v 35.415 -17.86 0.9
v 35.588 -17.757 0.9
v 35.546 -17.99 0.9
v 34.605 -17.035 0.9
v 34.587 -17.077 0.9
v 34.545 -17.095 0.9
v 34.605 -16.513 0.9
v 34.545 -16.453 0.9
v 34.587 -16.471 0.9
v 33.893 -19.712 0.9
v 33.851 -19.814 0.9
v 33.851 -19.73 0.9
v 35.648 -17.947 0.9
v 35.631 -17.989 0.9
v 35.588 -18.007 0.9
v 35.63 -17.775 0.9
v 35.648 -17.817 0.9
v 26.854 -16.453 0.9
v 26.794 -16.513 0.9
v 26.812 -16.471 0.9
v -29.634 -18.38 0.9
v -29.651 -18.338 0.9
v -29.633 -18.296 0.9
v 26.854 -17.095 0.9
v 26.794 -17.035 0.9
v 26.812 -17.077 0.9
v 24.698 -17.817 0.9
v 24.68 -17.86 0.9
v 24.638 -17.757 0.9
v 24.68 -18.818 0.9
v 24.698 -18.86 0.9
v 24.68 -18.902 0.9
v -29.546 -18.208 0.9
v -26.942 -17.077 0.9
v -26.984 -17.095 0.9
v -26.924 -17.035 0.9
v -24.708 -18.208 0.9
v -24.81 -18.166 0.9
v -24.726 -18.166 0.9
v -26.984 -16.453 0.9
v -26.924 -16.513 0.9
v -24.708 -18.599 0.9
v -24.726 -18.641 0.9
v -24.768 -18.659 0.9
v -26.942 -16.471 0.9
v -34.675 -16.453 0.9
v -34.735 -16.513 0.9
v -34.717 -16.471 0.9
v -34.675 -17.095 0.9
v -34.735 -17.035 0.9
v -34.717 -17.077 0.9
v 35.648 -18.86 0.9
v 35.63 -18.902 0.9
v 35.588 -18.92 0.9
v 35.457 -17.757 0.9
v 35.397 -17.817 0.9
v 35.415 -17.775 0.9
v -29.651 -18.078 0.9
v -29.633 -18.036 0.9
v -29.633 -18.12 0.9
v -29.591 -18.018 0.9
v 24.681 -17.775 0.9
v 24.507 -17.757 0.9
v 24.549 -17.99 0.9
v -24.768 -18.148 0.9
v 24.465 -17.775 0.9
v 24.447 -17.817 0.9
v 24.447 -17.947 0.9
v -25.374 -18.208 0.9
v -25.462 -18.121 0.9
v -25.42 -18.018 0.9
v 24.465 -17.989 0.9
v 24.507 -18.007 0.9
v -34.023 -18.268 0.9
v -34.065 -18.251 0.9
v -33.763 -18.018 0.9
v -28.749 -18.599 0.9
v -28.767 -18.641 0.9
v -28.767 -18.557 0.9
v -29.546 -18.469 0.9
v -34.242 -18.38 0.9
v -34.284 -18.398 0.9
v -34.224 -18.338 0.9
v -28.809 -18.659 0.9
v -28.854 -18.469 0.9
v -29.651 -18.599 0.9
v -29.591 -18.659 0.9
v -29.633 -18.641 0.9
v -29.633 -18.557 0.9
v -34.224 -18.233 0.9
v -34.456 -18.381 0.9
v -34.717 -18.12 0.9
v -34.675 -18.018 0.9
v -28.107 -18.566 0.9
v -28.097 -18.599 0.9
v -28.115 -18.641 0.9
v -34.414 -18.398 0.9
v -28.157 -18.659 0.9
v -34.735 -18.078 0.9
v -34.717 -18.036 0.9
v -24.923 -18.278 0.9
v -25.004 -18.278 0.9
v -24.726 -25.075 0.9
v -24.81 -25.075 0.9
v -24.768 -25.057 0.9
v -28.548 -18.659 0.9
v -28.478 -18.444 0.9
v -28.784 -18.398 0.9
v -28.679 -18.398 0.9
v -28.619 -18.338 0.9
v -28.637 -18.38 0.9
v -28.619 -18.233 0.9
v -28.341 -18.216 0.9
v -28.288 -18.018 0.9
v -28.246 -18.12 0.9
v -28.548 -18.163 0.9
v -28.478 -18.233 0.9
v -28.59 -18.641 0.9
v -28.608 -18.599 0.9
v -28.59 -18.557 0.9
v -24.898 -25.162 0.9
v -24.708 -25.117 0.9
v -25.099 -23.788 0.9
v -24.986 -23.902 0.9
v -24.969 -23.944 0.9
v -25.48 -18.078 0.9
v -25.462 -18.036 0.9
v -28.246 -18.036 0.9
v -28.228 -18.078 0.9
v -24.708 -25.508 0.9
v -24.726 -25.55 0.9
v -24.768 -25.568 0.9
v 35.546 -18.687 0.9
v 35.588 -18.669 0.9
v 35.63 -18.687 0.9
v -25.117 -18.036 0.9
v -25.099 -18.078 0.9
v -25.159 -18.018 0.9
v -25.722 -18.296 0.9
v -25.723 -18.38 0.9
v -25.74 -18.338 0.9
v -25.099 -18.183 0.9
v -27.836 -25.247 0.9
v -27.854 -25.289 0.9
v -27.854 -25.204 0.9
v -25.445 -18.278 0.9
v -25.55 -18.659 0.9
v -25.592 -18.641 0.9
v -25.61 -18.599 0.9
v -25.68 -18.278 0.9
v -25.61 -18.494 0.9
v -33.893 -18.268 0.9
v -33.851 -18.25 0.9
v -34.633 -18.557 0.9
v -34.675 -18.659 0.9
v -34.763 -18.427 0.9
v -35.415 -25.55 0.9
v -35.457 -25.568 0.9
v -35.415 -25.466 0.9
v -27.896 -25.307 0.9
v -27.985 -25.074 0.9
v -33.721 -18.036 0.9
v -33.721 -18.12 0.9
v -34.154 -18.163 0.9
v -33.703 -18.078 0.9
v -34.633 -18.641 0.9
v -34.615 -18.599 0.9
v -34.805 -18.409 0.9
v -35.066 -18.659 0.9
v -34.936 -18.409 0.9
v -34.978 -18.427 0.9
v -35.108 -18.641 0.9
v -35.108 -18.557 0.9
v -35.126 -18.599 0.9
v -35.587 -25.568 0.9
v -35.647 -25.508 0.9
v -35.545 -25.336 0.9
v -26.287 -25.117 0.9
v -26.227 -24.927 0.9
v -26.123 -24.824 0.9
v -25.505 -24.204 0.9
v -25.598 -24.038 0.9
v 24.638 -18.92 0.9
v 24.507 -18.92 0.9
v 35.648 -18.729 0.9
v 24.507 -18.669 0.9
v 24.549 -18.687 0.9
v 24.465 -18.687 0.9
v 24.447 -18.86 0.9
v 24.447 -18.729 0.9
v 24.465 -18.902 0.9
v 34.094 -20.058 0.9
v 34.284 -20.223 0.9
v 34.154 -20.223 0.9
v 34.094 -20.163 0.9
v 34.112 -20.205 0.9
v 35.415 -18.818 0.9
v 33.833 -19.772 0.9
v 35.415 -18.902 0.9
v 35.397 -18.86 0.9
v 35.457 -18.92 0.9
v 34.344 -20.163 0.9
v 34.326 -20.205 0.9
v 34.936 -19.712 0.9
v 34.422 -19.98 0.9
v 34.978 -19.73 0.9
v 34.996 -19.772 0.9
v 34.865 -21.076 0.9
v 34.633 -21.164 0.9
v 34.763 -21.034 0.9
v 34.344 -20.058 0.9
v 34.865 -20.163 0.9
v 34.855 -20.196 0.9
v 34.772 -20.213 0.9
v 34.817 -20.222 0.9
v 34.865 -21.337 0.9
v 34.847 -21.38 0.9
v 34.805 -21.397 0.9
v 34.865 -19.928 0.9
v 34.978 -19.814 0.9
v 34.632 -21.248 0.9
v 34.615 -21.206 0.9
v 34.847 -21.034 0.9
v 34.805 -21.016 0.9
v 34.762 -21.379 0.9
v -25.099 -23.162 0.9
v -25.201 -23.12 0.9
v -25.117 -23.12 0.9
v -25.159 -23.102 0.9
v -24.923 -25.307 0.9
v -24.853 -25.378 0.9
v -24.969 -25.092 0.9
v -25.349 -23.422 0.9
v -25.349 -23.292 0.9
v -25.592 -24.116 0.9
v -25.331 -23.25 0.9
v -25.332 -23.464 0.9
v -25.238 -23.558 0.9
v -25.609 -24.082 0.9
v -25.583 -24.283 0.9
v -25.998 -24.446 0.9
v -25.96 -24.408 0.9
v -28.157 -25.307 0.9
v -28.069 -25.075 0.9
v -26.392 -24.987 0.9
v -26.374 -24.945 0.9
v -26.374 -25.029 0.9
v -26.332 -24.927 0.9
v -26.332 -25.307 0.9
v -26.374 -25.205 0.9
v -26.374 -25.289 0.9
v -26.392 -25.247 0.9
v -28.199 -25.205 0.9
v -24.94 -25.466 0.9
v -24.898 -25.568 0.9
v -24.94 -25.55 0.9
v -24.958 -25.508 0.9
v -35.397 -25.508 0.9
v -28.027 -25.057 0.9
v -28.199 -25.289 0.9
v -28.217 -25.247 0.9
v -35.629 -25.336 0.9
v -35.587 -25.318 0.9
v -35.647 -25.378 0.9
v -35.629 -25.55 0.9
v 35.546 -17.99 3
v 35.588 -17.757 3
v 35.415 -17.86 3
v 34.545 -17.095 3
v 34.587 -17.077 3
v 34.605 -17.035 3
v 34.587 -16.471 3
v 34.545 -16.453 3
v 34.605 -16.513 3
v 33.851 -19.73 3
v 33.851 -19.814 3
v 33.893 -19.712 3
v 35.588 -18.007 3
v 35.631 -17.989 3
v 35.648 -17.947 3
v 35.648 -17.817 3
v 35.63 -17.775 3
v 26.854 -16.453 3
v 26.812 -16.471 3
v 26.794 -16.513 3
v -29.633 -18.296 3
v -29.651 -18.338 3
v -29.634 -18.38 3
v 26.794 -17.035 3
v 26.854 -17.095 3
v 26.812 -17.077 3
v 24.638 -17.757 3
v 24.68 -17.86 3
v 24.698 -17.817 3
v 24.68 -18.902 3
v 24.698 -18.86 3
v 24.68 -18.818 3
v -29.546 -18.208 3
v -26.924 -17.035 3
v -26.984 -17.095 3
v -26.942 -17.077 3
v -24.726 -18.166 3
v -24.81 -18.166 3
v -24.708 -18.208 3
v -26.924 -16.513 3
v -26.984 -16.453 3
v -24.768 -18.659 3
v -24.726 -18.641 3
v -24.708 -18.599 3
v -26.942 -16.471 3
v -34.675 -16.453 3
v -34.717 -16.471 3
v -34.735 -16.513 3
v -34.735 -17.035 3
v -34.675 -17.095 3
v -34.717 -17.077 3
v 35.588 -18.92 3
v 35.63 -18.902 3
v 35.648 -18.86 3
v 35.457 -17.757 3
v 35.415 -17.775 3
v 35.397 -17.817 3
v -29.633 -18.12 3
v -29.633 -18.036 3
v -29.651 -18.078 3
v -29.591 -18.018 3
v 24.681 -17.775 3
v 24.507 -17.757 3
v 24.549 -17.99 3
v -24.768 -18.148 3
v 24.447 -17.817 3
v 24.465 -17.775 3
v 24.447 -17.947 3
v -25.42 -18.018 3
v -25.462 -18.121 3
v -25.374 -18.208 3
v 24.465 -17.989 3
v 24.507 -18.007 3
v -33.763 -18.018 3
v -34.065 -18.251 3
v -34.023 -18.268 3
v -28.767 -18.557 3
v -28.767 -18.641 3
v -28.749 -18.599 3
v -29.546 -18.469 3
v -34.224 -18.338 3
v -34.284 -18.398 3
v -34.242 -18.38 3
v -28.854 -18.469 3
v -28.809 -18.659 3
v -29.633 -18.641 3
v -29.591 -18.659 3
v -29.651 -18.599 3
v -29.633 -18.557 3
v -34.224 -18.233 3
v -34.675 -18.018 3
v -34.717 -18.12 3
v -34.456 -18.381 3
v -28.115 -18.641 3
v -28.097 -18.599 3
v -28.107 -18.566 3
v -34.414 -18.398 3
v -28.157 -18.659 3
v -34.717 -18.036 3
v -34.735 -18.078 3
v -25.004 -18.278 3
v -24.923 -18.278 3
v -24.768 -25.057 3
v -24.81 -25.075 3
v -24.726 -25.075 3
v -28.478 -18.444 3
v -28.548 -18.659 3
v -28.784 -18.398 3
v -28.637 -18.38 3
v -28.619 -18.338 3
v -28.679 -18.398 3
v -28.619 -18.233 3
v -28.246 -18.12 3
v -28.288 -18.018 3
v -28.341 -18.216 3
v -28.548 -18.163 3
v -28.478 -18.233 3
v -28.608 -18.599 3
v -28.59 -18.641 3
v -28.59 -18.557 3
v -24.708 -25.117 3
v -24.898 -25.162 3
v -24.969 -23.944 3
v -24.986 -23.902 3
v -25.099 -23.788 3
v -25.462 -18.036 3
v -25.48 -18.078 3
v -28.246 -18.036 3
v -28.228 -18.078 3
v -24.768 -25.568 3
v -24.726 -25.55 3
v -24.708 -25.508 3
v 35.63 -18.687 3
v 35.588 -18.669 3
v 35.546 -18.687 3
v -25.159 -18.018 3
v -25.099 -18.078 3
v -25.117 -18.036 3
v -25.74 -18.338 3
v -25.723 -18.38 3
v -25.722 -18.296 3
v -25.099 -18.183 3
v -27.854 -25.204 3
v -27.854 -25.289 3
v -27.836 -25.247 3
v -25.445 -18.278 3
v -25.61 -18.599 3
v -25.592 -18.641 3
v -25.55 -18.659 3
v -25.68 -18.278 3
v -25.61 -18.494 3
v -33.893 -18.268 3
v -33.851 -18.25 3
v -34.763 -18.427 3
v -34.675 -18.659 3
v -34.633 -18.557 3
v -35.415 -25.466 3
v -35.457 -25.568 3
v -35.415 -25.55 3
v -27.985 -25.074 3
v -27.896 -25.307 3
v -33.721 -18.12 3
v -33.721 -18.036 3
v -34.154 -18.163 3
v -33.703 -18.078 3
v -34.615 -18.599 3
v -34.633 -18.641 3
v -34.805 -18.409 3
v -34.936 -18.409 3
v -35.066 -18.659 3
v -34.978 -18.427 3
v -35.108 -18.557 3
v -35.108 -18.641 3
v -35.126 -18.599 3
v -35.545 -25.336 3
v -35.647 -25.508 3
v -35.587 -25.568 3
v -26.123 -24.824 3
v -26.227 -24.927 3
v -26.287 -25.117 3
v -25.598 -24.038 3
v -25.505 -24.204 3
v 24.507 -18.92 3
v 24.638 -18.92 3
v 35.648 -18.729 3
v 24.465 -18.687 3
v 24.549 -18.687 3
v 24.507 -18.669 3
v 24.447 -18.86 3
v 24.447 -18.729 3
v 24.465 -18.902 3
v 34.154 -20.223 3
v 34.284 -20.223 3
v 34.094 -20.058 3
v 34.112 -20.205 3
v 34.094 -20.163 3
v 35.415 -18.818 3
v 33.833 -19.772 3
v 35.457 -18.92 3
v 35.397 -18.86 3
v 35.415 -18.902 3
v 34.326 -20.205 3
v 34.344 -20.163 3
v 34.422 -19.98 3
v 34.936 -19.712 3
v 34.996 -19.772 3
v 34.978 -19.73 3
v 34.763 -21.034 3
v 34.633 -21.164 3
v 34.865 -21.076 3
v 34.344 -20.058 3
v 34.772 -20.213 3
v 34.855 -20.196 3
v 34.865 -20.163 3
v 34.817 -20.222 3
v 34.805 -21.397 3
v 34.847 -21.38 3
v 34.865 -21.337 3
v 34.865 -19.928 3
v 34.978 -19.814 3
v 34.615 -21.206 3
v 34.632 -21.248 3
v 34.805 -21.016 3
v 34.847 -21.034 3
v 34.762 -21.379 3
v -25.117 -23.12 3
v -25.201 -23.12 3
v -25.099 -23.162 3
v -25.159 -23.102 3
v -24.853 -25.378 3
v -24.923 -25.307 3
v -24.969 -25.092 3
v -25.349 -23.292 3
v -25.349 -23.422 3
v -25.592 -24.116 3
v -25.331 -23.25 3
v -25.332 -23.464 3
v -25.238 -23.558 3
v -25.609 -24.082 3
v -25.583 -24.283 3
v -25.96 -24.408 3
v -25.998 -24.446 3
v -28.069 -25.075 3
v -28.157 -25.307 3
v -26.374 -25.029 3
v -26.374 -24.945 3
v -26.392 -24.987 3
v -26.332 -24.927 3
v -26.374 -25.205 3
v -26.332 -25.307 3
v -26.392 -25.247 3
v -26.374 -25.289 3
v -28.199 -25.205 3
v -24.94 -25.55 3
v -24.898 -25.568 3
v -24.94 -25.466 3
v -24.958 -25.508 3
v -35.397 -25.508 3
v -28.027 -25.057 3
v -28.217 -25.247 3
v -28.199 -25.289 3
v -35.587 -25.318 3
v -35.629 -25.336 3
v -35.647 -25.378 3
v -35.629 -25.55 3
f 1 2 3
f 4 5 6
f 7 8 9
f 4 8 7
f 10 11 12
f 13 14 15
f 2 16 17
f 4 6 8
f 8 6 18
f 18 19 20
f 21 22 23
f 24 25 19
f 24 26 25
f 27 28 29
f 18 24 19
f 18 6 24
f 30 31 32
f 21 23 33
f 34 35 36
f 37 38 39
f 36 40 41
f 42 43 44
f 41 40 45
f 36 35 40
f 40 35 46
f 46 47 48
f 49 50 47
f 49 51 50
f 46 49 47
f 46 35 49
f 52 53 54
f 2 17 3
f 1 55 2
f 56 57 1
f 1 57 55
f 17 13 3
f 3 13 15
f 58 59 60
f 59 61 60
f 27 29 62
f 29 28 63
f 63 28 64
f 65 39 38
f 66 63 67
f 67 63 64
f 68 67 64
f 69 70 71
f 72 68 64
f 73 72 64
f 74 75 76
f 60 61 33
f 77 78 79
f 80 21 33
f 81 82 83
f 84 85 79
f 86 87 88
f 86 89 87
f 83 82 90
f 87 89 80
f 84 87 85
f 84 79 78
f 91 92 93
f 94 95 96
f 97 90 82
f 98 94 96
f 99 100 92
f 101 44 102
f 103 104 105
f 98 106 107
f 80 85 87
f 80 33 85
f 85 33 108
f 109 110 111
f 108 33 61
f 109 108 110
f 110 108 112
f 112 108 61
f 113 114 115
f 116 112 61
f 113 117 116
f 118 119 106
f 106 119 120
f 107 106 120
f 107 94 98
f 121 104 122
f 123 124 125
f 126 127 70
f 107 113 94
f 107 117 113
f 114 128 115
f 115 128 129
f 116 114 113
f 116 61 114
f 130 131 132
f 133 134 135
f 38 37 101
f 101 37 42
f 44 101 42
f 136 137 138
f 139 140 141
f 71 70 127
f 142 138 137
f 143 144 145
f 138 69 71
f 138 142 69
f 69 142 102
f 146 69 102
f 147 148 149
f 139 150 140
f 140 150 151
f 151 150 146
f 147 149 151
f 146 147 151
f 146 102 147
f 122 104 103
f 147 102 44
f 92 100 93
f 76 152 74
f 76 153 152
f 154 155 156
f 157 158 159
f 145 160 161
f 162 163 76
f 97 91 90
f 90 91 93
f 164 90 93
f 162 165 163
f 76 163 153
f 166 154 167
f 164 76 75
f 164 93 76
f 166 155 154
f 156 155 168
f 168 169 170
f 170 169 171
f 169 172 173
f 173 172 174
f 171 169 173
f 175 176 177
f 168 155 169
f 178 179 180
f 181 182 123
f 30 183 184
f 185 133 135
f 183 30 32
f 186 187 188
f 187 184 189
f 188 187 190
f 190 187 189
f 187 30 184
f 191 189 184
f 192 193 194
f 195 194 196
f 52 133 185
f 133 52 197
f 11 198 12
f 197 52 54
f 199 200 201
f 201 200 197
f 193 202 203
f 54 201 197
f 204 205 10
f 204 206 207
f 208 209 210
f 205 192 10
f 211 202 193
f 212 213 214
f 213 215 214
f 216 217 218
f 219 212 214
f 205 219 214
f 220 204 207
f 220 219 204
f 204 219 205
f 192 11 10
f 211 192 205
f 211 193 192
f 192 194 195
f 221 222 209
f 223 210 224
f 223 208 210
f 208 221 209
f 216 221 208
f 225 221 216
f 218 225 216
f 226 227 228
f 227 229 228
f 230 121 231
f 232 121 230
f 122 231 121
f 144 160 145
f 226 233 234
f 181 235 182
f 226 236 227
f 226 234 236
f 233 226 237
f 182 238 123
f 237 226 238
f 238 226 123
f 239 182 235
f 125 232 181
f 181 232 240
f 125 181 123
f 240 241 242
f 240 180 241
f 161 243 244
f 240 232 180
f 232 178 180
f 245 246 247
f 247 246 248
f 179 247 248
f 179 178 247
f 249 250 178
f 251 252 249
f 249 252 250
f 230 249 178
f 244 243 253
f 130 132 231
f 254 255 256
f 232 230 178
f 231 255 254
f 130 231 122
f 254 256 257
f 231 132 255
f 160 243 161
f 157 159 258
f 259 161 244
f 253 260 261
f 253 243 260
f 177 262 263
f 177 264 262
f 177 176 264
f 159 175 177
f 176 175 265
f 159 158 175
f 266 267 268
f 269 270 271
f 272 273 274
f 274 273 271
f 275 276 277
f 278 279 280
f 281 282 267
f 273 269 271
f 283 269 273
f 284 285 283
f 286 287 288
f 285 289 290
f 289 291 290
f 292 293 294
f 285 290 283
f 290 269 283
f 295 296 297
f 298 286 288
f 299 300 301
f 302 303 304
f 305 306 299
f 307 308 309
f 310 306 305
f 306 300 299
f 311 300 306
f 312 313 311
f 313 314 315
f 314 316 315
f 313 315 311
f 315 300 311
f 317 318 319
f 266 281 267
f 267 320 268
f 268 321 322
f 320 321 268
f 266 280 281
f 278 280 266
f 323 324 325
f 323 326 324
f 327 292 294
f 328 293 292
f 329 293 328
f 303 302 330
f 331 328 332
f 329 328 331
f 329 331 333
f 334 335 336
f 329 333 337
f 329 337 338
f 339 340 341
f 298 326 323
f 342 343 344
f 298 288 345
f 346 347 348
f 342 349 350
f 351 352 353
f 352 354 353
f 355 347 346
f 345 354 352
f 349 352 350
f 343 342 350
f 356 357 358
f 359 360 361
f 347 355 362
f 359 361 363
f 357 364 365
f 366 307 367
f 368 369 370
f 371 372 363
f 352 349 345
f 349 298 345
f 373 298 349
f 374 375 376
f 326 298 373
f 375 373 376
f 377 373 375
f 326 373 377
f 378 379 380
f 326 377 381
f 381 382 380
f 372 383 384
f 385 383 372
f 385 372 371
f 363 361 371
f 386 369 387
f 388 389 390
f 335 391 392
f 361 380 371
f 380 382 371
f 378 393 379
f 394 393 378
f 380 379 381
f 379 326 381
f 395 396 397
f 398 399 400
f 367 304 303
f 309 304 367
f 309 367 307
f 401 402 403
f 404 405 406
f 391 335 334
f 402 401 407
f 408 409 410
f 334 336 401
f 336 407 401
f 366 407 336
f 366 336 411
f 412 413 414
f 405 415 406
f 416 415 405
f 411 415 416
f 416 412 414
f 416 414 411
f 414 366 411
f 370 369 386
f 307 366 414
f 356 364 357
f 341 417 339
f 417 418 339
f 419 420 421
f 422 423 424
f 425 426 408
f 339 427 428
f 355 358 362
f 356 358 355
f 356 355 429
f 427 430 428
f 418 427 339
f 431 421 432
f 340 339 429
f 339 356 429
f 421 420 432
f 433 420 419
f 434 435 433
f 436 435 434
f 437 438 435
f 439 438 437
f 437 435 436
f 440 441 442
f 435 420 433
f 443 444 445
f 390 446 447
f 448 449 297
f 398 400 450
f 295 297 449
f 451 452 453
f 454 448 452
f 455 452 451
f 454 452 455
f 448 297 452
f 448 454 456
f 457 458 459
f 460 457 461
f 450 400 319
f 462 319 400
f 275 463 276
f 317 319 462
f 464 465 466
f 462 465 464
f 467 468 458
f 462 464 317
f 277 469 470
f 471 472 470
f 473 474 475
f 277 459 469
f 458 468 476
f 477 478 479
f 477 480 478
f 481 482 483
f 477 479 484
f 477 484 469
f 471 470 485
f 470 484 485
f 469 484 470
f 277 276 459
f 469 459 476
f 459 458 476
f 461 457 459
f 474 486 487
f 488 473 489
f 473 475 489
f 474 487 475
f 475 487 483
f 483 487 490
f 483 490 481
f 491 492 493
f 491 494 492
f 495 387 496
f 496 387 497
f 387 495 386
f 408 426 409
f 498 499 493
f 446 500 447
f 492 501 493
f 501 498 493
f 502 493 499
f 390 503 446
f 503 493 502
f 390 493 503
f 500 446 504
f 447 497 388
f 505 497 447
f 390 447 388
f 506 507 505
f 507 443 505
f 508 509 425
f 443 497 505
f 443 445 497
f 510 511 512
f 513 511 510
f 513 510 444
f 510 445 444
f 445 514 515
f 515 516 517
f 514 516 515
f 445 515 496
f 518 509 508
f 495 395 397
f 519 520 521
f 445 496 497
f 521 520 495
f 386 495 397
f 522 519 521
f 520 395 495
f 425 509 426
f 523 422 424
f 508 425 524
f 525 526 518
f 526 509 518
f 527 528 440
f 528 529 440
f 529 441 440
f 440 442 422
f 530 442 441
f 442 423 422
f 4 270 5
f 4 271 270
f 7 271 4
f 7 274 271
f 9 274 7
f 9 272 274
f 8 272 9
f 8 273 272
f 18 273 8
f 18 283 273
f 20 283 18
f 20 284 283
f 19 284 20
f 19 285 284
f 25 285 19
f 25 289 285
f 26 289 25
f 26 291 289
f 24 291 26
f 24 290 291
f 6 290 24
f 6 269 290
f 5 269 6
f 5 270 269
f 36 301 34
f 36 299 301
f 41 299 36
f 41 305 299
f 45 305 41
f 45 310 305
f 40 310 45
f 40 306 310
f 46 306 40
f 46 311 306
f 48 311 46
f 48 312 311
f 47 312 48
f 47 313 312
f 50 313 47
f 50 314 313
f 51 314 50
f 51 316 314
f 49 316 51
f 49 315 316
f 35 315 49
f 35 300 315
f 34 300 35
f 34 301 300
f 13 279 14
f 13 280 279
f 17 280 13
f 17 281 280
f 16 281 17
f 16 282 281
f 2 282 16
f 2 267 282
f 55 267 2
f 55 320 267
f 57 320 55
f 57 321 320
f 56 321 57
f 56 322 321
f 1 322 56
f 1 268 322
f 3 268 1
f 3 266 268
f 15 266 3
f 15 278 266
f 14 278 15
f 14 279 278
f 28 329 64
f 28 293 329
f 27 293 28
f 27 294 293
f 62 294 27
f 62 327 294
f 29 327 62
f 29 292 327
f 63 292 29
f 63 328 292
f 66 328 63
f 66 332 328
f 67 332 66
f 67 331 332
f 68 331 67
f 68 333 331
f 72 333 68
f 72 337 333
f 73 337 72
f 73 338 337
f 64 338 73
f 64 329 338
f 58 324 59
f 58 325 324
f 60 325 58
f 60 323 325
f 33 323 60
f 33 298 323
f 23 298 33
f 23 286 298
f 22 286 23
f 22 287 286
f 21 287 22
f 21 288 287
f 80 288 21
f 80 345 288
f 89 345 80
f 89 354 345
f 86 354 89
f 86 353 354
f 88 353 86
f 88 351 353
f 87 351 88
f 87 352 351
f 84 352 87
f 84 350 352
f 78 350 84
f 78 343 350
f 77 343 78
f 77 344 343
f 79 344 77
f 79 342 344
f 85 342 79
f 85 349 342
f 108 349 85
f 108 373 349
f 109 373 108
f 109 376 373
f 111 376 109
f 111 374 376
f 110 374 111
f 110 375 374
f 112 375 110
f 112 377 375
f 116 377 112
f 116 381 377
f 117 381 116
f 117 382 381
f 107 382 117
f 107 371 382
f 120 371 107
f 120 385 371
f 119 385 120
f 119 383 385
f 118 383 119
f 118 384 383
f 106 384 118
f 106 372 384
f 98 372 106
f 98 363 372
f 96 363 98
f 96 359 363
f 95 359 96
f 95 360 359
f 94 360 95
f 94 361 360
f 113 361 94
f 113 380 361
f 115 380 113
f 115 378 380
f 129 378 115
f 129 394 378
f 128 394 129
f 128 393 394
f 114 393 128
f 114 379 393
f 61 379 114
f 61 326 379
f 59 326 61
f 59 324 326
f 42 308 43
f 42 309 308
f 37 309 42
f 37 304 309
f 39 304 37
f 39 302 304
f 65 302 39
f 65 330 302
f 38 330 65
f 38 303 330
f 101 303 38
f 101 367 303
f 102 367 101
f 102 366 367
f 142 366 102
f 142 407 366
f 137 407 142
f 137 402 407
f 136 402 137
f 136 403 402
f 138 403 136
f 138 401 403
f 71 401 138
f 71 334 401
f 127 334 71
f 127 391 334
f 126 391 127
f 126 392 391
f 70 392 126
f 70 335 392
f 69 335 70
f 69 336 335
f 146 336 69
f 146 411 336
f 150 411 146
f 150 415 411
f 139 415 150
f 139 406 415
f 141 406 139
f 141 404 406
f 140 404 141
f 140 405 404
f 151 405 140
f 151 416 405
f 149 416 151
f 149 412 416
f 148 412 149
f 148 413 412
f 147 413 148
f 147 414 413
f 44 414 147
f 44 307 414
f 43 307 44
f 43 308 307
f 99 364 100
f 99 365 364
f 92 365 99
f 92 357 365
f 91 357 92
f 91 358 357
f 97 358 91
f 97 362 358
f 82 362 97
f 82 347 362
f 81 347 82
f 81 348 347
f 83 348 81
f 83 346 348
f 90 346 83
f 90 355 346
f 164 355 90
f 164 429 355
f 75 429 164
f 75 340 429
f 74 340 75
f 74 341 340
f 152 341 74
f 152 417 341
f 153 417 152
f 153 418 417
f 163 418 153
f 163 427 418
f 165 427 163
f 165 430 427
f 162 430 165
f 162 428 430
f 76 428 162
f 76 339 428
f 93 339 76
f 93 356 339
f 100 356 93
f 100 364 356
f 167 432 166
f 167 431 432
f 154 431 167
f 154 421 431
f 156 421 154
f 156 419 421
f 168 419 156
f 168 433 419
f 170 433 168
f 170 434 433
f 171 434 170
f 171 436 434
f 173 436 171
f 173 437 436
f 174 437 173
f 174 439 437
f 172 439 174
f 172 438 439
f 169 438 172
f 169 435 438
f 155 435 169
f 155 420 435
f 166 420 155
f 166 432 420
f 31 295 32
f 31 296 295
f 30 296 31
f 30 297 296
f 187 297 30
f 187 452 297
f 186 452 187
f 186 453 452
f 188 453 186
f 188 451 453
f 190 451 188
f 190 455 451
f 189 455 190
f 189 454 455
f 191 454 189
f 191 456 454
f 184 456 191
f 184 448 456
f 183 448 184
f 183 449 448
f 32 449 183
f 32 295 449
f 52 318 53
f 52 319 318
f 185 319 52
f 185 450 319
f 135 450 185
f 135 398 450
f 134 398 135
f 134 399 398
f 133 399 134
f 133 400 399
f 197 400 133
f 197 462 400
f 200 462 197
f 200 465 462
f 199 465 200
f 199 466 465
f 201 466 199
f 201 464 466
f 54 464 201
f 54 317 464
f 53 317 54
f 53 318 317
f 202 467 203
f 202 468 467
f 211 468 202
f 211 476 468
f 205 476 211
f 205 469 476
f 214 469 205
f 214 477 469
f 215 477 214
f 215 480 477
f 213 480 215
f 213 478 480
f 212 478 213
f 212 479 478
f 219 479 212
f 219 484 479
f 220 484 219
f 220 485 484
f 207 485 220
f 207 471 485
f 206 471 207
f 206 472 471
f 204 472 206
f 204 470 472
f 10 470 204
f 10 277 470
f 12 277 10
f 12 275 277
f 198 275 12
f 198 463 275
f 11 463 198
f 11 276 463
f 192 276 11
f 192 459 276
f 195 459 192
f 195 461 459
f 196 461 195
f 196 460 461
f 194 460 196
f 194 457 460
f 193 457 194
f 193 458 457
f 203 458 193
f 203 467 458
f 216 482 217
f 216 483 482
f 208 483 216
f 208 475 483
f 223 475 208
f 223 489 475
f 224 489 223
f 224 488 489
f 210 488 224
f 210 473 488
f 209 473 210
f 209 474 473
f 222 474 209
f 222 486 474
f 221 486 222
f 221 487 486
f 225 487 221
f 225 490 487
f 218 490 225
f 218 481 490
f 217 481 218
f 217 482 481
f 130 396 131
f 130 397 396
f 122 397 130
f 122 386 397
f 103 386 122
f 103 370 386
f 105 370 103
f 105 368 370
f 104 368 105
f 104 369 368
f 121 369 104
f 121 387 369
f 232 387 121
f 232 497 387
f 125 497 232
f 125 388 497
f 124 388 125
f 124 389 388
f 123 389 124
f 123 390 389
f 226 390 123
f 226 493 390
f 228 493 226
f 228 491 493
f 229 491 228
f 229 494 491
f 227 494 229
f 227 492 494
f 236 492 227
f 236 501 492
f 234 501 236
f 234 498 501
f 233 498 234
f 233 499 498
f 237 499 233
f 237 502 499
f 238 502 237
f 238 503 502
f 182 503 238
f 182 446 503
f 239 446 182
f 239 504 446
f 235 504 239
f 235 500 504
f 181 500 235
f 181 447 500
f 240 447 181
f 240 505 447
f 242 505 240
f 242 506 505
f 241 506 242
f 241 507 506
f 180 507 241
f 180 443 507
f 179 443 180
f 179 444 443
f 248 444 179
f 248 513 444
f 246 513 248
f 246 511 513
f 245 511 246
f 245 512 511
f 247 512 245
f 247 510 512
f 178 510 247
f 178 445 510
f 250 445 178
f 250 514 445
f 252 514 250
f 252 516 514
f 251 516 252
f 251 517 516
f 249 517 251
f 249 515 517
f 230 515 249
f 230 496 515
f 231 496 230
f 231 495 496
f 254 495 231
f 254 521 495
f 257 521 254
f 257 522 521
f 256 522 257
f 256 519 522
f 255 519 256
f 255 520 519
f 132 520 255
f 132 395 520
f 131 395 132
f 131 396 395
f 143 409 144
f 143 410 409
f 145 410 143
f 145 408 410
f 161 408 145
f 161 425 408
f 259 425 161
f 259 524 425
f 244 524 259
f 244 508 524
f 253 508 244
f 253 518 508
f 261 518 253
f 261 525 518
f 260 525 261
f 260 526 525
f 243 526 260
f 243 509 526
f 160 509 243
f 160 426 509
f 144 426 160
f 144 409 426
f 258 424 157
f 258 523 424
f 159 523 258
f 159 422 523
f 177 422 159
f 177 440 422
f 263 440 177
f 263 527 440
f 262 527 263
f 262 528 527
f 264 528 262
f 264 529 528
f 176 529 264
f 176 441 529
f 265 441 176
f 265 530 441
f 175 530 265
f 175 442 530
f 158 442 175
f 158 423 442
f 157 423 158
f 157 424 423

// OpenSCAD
$fn = 24;
translate([0, -2.500, 0.900])
  linear_extrude(height=2.100) {
offset(r=0.06, $fn=8) {
    polygon(points=[[-25.029,-18.837],[-25.029,-19.879],[-25.159,-20.010],[-25.159,-20.662],[-25.289,-20.792],[-25.289,-20.922],[-25.159,-21.053],[-25.550,-21.574],[-25.420,-21.704],[-25.550,-21.835],[-25.941,-21.965],[-26.071,-22.356],[-26.202,-22.487],[-26.332,-22.487],[-26.202,-22.617],[-26.332,-22.747],[-27.896,-22.747],[-28.027,-22.617],[-28.157,-22.747],[-29.461,-22.747],[-24.898,-22.747],[-24.768,-22.878],[-24.898,-23.008],[-35.457,-23.008],[-35.587,-22.878],[-35.587,-22.747],[-35.587,-23.008],[-24.768,-23.008],[-24.768,-21.965],[-24.768,-22.617],[-24.898,-22.747],[-25.029,-22.617],[-25.029,-21.444],[-24.898,-21.313],[-24.898,-20.401],[-24.898,-21.313],[-25.029,-21.444],[-25.159,-21.313],[-25.159,-20.010],[-25.029,-19.879]], paths=[[0,1,2,3,4,5,6,7,8,9,10,11,12,13,14,15,16,17,18,19,20,21,22,23,24,25,26,27,28,29,30,31,32,33,34,35,36,37,38,39]]);
    polygon(points=[[25.420,-17.272],[33.893,-17.272],[34.154,-17.533],[34.154,-17.663],[34.023,-17.794],[34.154,-17.663],[34.284,-17.663],[34.284,-17.533],[34.414,-17.403],[34.805,-17.663],[34.805,-18.576],[34.675,-18.706],[34.545,-18.706],[34.675,-18.706],[34.805,-18.837],[34.805,-18.967],[34.805,-17.403],[34.936,-17.272]], paths=[[0,1,2,3,4,5,6,7,8,9,10,11,12,13,14,15,16,17]]);
    polygon(points=[[-35.457,-16.099],[-26.071,-16.099],[-28.157,-16.099],[-28.418,-15.708],[-28.288,-15.578],[-25.420,-15.578],[-25.289,-15.708],[-25.420,-15.838],[-25.680,-15.838],[-25.550,-15.969],[-25.550,-16.099],[-24.768,-16.099],[-24.768,-15.708],[-24.898,-15.838],[-25.029,-15.838],[-25.159,-15.708],[-25.159,-15.578],[-34.936,-15.578],[-34.675,-15.578],[-34.414,-15.838],[-34.284,-15.838],[-34.284,-15.708],[-34.154,-15.578],[-34.023,-15.708],[-33.893,-15.708],[-33.763,-15.578],[-29.591,-15.578],[-29.461,-15.708],[-29.591,-15.838],[-29.461,-15.969],[-29.591,-16.099],[-34.675,-16.099],[-34.805,-15.969],[-34.936,-15.969],[-35.066,-16.099],[-28.548,-15.578],[-28.418,-15.708],[-28.418,-15.969],[-28.548,-16.099],[-28.809,-16.099],[-28.939,-15.969],[-28.809,-15.838],[-28.679,-15.838],[-28.679,-15.708]], paths=[[0,1,2,3,4,5,6,7,8,9,10,11,12,13,14,15,16,17,18,19,20,21,22,23,24,25,26,27,28,29,30,31,32,33,34],[35,36,37,38,39,40,41,42,43]]);
    polygon(points=[[24.507,-15.317],[24.507,-16.360],[35.588,-16.360],[35.588,-15.317],[24.507,-15.447],[24.638,-15.317],[35.457,-15.317],[35.588,-15.447],[35.588,-16.229],[35.457,-16.360],[24.638,-16.360],[24.507,-16.229]], paths=[[0,1,2,3],[4,5,6,7,8,9,10,11]]);
    polygon(points=[[26.854,-14.013],[26.854,-14.535],[34.545,-14.535],[34.545,-14.013]], paths=[[0,1,2,3]]);
    polygon(points=[[-34.675,-14.013],[-34.675,-14.535],[-26.984,-14.535],[-26.984,-14.013]], paths=[[0,1,2,3]]);
}
}
